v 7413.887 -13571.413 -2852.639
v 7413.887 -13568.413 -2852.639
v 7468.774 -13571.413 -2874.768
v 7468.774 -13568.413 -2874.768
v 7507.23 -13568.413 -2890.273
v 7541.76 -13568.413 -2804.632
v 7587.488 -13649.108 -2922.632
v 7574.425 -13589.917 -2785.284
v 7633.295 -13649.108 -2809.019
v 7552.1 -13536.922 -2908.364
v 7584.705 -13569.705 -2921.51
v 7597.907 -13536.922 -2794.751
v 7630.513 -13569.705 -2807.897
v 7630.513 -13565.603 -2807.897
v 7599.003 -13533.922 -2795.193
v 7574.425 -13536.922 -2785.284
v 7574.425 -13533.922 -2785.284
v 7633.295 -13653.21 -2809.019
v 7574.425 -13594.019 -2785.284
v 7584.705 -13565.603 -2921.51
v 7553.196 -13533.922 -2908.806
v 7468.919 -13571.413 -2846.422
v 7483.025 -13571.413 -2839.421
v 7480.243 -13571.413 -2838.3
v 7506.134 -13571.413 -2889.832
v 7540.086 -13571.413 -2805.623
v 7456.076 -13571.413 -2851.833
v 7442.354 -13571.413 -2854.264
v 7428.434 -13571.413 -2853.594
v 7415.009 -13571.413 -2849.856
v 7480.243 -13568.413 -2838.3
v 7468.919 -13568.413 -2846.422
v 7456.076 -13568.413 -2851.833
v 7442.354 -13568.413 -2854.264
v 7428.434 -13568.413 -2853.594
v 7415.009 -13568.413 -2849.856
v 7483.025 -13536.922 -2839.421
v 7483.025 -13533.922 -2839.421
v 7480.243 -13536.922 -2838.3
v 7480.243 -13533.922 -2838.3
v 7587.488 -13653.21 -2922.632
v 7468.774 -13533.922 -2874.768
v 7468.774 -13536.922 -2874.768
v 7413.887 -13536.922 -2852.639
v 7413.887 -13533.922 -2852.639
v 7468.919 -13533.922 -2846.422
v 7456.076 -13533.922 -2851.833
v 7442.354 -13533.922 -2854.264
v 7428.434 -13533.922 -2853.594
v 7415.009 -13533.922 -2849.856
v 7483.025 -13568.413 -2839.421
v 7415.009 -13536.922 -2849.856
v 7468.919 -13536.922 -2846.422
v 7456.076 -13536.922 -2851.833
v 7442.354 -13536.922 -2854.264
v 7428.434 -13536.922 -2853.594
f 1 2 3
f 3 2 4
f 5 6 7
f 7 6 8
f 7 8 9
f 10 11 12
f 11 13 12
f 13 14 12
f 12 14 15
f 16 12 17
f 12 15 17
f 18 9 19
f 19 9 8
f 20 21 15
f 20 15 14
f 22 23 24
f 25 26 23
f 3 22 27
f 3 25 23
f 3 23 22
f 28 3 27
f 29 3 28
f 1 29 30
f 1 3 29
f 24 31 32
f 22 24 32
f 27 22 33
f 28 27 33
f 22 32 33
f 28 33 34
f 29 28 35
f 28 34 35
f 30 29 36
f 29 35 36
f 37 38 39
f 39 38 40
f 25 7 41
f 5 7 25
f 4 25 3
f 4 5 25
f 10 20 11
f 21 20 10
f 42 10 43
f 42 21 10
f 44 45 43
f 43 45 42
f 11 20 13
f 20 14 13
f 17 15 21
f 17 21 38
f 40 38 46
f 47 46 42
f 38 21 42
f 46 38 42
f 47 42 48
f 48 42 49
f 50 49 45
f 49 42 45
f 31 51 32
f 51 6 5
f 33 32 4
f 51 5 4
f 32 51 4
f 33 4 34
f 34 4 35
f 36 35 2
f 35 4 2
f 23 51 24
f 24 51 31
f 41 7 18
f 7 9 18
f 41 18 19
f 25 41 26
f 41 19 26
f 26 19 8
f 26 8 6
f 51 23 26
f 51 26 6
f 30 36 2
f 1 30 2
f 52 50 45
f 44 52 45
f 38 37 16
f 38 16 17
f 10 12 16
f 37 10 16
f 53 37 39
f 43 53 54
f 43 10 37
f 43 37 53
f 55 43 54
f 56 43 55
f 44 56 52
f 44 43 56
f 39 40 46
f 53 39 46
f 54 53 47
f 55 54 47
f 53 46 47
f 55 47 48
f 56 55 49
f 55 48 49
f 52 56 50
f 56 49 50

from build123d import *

# Parameters (mm, degrees)
BOSS_EXTRUDE1_DEPTH      = 55
BOSS_EXTRUDE1_DEPTH_BACK = 67.5
BOSS_EXTRUDE2_DEPTH      = 55
BOSS_EXTRUDE2_DEPTH_BACK = 67.5
CUT_EXTRUDE1_DEPTH       = 194.123099162
CUT_EXTRUDE1_DEPTH_BACK  = 57.71160285
BOSS_EXTRUDE5_DEPTH      = 3
BOSS_EXTRUDE6_DEPTH      = 3


with BuildPart() as part:
    # Sketch2 → Boss-Extrude1 (new body, two sides)
    with BuildSketch(Plane(origin=(72.595893754, -2e-08, 180.055099249), x_dir=(0.927453922, 0, -0.373937459), z_dir=(0.373937459, 0, 0.927453922))) as boss_extrude1_sk:
        Polygon((8043.391436199, -13568.412897804), (8129.926832864, -13649.108460679), (8129.926832864, -13653.210443062), (8042.209704772, -13571.412897804), (8001.926832866, -13571.412897804), (8001.926832866, -13568.412897804), align=None)
    extrude(amount=BOSS_EXTRUDE1_DEPTH)
    extrude(boss_extrude1_sk.sketch, amount=-BOSS_EXTRUDE1_DEPTH_BACK)


with BuildPart() as body_2:
    # Sketch3 → Boss-Extrude2 (new body, two sides)
    with BuildSketch(Plane(origin=(72.595893754, -2e-08, 180.055099249), x_dir=(0.927453922, 0, -0.373937459), z_dir=(0.373937459, 0, 0.927453922))) as boss_extrude2_sk:
        Polygon((8092.953051272, -13533.922108249), (8126.926832864, -13565.603172116), (8126.926832864, -13569.7051545), (8091.771319846, -13536.922108249), (8001.926832866, -13536.922108249), (8001.926832866, -13533.922108249), align=None)
    extrude(amount=BOSS_EXTRUDE2_DEPTH)
    extrude(boss_extrude2_sk.sketch, amount=-BOSS_EXTRUDE2_DEPTH_BACK)


with BuildPart() as cut_extrude1_tool:
    # Sketch6 → Cut-Extrude1 (new body, two sides)
    with BuildSketch(Plane(origin=(-2930.658309925, -2661.194571048, -1735.87479532), x_dir=(0.733591849, -0.601256823, -0.316754213), z_dir=(-0.678001315, -0.615661475, -0.401590793))) as cut_extrude1_sk:
        Polygon((14605.462292695, 4343.710456856), (14689.493196271, 4244.519694966), (14507.849800843, 4090.637837869), (14423.818897267, 4189.828599759), align=None)
    extrude(amount=CUT_EXTRUDE1_DEPTH)
    extrude(cut_extrude1_sk.sketch, amount=-CUT_EXTRUDE1_DEPTH_BACK)


with BuildPart() as part_1:
    add(part.part)

    # Cut-Extrude1: cut by cut_extrude1_tool
    add(cut_extrude1_tool.part, mode=Mode.SUBTRACT)

    # Sketch12 → Boss-Extrude5 (add)
    with BuildSketch(Plane(origin=(-7.11e-07, -13568.412897804, -1.209e-06), x_dir=(1, 0, 0), z_dir=(0, 1, 0))):
        with BuildLine():
            Line((7468.77353605, 2874.76822987), (7483.024952786, 2839.421323564))
            Line((7483.024952786, 2839.421323564), (7480.242591021, 2838.299511186))
            ThreePointArc((7480.242591021, 2838.299511186), (7449.28307219, 2853.432242254), (7415.009102394, 2849.856441601))
            Line((7415.009102394, 2849.856441601), (7413.887290016, 2852.638803365))
            Line((7413.887290016, 2852.638803365), (7468.77353605, 2874.76822987))
        make_face()
    extrude(amount=-BOSS_EXTRUDE5_DEPTH)


with BuildPart() as body_2_1:
    add(body_2.part)

    # Cut-Extrude1: cut by cut_extrude1_tool
    add(cut_extrude1_tool.part, mode=Mode.SUBTRACT)

    # Sketch13 → Boss-Extrude6 (add)
    with BuildSketch(Plane(origin=(-7.09e-07, -13533.922108249, -1.206e-06), x_dir=(1, 0, 0), z_dir=(0, 1, 0))):
        with BuildLine():
            Line((7415.009102394, 2849.856441601), (7413.887290016, 2852.638803365))
            Line((7413.887290016, 2852.638803365), (7468.77353605, 2874.76822987))
            Line((7468.77353605, 2874.76822987), (7483.024952786, 2839.421323564))
            Line((7483.024952786, 2839.421323564), (7480.242591021, 2838.299511186))
            ThreePointArc((7480.242591021, 2838.299511186), (7449.28307219, 2853.432242254), (7415.009102394, 2849.856441601))
        make_face()
    extrude(amount=-BOSS_EXTRUDE6_DEPTH)


solid = Compound([part_1.part, body_2_1.part])
